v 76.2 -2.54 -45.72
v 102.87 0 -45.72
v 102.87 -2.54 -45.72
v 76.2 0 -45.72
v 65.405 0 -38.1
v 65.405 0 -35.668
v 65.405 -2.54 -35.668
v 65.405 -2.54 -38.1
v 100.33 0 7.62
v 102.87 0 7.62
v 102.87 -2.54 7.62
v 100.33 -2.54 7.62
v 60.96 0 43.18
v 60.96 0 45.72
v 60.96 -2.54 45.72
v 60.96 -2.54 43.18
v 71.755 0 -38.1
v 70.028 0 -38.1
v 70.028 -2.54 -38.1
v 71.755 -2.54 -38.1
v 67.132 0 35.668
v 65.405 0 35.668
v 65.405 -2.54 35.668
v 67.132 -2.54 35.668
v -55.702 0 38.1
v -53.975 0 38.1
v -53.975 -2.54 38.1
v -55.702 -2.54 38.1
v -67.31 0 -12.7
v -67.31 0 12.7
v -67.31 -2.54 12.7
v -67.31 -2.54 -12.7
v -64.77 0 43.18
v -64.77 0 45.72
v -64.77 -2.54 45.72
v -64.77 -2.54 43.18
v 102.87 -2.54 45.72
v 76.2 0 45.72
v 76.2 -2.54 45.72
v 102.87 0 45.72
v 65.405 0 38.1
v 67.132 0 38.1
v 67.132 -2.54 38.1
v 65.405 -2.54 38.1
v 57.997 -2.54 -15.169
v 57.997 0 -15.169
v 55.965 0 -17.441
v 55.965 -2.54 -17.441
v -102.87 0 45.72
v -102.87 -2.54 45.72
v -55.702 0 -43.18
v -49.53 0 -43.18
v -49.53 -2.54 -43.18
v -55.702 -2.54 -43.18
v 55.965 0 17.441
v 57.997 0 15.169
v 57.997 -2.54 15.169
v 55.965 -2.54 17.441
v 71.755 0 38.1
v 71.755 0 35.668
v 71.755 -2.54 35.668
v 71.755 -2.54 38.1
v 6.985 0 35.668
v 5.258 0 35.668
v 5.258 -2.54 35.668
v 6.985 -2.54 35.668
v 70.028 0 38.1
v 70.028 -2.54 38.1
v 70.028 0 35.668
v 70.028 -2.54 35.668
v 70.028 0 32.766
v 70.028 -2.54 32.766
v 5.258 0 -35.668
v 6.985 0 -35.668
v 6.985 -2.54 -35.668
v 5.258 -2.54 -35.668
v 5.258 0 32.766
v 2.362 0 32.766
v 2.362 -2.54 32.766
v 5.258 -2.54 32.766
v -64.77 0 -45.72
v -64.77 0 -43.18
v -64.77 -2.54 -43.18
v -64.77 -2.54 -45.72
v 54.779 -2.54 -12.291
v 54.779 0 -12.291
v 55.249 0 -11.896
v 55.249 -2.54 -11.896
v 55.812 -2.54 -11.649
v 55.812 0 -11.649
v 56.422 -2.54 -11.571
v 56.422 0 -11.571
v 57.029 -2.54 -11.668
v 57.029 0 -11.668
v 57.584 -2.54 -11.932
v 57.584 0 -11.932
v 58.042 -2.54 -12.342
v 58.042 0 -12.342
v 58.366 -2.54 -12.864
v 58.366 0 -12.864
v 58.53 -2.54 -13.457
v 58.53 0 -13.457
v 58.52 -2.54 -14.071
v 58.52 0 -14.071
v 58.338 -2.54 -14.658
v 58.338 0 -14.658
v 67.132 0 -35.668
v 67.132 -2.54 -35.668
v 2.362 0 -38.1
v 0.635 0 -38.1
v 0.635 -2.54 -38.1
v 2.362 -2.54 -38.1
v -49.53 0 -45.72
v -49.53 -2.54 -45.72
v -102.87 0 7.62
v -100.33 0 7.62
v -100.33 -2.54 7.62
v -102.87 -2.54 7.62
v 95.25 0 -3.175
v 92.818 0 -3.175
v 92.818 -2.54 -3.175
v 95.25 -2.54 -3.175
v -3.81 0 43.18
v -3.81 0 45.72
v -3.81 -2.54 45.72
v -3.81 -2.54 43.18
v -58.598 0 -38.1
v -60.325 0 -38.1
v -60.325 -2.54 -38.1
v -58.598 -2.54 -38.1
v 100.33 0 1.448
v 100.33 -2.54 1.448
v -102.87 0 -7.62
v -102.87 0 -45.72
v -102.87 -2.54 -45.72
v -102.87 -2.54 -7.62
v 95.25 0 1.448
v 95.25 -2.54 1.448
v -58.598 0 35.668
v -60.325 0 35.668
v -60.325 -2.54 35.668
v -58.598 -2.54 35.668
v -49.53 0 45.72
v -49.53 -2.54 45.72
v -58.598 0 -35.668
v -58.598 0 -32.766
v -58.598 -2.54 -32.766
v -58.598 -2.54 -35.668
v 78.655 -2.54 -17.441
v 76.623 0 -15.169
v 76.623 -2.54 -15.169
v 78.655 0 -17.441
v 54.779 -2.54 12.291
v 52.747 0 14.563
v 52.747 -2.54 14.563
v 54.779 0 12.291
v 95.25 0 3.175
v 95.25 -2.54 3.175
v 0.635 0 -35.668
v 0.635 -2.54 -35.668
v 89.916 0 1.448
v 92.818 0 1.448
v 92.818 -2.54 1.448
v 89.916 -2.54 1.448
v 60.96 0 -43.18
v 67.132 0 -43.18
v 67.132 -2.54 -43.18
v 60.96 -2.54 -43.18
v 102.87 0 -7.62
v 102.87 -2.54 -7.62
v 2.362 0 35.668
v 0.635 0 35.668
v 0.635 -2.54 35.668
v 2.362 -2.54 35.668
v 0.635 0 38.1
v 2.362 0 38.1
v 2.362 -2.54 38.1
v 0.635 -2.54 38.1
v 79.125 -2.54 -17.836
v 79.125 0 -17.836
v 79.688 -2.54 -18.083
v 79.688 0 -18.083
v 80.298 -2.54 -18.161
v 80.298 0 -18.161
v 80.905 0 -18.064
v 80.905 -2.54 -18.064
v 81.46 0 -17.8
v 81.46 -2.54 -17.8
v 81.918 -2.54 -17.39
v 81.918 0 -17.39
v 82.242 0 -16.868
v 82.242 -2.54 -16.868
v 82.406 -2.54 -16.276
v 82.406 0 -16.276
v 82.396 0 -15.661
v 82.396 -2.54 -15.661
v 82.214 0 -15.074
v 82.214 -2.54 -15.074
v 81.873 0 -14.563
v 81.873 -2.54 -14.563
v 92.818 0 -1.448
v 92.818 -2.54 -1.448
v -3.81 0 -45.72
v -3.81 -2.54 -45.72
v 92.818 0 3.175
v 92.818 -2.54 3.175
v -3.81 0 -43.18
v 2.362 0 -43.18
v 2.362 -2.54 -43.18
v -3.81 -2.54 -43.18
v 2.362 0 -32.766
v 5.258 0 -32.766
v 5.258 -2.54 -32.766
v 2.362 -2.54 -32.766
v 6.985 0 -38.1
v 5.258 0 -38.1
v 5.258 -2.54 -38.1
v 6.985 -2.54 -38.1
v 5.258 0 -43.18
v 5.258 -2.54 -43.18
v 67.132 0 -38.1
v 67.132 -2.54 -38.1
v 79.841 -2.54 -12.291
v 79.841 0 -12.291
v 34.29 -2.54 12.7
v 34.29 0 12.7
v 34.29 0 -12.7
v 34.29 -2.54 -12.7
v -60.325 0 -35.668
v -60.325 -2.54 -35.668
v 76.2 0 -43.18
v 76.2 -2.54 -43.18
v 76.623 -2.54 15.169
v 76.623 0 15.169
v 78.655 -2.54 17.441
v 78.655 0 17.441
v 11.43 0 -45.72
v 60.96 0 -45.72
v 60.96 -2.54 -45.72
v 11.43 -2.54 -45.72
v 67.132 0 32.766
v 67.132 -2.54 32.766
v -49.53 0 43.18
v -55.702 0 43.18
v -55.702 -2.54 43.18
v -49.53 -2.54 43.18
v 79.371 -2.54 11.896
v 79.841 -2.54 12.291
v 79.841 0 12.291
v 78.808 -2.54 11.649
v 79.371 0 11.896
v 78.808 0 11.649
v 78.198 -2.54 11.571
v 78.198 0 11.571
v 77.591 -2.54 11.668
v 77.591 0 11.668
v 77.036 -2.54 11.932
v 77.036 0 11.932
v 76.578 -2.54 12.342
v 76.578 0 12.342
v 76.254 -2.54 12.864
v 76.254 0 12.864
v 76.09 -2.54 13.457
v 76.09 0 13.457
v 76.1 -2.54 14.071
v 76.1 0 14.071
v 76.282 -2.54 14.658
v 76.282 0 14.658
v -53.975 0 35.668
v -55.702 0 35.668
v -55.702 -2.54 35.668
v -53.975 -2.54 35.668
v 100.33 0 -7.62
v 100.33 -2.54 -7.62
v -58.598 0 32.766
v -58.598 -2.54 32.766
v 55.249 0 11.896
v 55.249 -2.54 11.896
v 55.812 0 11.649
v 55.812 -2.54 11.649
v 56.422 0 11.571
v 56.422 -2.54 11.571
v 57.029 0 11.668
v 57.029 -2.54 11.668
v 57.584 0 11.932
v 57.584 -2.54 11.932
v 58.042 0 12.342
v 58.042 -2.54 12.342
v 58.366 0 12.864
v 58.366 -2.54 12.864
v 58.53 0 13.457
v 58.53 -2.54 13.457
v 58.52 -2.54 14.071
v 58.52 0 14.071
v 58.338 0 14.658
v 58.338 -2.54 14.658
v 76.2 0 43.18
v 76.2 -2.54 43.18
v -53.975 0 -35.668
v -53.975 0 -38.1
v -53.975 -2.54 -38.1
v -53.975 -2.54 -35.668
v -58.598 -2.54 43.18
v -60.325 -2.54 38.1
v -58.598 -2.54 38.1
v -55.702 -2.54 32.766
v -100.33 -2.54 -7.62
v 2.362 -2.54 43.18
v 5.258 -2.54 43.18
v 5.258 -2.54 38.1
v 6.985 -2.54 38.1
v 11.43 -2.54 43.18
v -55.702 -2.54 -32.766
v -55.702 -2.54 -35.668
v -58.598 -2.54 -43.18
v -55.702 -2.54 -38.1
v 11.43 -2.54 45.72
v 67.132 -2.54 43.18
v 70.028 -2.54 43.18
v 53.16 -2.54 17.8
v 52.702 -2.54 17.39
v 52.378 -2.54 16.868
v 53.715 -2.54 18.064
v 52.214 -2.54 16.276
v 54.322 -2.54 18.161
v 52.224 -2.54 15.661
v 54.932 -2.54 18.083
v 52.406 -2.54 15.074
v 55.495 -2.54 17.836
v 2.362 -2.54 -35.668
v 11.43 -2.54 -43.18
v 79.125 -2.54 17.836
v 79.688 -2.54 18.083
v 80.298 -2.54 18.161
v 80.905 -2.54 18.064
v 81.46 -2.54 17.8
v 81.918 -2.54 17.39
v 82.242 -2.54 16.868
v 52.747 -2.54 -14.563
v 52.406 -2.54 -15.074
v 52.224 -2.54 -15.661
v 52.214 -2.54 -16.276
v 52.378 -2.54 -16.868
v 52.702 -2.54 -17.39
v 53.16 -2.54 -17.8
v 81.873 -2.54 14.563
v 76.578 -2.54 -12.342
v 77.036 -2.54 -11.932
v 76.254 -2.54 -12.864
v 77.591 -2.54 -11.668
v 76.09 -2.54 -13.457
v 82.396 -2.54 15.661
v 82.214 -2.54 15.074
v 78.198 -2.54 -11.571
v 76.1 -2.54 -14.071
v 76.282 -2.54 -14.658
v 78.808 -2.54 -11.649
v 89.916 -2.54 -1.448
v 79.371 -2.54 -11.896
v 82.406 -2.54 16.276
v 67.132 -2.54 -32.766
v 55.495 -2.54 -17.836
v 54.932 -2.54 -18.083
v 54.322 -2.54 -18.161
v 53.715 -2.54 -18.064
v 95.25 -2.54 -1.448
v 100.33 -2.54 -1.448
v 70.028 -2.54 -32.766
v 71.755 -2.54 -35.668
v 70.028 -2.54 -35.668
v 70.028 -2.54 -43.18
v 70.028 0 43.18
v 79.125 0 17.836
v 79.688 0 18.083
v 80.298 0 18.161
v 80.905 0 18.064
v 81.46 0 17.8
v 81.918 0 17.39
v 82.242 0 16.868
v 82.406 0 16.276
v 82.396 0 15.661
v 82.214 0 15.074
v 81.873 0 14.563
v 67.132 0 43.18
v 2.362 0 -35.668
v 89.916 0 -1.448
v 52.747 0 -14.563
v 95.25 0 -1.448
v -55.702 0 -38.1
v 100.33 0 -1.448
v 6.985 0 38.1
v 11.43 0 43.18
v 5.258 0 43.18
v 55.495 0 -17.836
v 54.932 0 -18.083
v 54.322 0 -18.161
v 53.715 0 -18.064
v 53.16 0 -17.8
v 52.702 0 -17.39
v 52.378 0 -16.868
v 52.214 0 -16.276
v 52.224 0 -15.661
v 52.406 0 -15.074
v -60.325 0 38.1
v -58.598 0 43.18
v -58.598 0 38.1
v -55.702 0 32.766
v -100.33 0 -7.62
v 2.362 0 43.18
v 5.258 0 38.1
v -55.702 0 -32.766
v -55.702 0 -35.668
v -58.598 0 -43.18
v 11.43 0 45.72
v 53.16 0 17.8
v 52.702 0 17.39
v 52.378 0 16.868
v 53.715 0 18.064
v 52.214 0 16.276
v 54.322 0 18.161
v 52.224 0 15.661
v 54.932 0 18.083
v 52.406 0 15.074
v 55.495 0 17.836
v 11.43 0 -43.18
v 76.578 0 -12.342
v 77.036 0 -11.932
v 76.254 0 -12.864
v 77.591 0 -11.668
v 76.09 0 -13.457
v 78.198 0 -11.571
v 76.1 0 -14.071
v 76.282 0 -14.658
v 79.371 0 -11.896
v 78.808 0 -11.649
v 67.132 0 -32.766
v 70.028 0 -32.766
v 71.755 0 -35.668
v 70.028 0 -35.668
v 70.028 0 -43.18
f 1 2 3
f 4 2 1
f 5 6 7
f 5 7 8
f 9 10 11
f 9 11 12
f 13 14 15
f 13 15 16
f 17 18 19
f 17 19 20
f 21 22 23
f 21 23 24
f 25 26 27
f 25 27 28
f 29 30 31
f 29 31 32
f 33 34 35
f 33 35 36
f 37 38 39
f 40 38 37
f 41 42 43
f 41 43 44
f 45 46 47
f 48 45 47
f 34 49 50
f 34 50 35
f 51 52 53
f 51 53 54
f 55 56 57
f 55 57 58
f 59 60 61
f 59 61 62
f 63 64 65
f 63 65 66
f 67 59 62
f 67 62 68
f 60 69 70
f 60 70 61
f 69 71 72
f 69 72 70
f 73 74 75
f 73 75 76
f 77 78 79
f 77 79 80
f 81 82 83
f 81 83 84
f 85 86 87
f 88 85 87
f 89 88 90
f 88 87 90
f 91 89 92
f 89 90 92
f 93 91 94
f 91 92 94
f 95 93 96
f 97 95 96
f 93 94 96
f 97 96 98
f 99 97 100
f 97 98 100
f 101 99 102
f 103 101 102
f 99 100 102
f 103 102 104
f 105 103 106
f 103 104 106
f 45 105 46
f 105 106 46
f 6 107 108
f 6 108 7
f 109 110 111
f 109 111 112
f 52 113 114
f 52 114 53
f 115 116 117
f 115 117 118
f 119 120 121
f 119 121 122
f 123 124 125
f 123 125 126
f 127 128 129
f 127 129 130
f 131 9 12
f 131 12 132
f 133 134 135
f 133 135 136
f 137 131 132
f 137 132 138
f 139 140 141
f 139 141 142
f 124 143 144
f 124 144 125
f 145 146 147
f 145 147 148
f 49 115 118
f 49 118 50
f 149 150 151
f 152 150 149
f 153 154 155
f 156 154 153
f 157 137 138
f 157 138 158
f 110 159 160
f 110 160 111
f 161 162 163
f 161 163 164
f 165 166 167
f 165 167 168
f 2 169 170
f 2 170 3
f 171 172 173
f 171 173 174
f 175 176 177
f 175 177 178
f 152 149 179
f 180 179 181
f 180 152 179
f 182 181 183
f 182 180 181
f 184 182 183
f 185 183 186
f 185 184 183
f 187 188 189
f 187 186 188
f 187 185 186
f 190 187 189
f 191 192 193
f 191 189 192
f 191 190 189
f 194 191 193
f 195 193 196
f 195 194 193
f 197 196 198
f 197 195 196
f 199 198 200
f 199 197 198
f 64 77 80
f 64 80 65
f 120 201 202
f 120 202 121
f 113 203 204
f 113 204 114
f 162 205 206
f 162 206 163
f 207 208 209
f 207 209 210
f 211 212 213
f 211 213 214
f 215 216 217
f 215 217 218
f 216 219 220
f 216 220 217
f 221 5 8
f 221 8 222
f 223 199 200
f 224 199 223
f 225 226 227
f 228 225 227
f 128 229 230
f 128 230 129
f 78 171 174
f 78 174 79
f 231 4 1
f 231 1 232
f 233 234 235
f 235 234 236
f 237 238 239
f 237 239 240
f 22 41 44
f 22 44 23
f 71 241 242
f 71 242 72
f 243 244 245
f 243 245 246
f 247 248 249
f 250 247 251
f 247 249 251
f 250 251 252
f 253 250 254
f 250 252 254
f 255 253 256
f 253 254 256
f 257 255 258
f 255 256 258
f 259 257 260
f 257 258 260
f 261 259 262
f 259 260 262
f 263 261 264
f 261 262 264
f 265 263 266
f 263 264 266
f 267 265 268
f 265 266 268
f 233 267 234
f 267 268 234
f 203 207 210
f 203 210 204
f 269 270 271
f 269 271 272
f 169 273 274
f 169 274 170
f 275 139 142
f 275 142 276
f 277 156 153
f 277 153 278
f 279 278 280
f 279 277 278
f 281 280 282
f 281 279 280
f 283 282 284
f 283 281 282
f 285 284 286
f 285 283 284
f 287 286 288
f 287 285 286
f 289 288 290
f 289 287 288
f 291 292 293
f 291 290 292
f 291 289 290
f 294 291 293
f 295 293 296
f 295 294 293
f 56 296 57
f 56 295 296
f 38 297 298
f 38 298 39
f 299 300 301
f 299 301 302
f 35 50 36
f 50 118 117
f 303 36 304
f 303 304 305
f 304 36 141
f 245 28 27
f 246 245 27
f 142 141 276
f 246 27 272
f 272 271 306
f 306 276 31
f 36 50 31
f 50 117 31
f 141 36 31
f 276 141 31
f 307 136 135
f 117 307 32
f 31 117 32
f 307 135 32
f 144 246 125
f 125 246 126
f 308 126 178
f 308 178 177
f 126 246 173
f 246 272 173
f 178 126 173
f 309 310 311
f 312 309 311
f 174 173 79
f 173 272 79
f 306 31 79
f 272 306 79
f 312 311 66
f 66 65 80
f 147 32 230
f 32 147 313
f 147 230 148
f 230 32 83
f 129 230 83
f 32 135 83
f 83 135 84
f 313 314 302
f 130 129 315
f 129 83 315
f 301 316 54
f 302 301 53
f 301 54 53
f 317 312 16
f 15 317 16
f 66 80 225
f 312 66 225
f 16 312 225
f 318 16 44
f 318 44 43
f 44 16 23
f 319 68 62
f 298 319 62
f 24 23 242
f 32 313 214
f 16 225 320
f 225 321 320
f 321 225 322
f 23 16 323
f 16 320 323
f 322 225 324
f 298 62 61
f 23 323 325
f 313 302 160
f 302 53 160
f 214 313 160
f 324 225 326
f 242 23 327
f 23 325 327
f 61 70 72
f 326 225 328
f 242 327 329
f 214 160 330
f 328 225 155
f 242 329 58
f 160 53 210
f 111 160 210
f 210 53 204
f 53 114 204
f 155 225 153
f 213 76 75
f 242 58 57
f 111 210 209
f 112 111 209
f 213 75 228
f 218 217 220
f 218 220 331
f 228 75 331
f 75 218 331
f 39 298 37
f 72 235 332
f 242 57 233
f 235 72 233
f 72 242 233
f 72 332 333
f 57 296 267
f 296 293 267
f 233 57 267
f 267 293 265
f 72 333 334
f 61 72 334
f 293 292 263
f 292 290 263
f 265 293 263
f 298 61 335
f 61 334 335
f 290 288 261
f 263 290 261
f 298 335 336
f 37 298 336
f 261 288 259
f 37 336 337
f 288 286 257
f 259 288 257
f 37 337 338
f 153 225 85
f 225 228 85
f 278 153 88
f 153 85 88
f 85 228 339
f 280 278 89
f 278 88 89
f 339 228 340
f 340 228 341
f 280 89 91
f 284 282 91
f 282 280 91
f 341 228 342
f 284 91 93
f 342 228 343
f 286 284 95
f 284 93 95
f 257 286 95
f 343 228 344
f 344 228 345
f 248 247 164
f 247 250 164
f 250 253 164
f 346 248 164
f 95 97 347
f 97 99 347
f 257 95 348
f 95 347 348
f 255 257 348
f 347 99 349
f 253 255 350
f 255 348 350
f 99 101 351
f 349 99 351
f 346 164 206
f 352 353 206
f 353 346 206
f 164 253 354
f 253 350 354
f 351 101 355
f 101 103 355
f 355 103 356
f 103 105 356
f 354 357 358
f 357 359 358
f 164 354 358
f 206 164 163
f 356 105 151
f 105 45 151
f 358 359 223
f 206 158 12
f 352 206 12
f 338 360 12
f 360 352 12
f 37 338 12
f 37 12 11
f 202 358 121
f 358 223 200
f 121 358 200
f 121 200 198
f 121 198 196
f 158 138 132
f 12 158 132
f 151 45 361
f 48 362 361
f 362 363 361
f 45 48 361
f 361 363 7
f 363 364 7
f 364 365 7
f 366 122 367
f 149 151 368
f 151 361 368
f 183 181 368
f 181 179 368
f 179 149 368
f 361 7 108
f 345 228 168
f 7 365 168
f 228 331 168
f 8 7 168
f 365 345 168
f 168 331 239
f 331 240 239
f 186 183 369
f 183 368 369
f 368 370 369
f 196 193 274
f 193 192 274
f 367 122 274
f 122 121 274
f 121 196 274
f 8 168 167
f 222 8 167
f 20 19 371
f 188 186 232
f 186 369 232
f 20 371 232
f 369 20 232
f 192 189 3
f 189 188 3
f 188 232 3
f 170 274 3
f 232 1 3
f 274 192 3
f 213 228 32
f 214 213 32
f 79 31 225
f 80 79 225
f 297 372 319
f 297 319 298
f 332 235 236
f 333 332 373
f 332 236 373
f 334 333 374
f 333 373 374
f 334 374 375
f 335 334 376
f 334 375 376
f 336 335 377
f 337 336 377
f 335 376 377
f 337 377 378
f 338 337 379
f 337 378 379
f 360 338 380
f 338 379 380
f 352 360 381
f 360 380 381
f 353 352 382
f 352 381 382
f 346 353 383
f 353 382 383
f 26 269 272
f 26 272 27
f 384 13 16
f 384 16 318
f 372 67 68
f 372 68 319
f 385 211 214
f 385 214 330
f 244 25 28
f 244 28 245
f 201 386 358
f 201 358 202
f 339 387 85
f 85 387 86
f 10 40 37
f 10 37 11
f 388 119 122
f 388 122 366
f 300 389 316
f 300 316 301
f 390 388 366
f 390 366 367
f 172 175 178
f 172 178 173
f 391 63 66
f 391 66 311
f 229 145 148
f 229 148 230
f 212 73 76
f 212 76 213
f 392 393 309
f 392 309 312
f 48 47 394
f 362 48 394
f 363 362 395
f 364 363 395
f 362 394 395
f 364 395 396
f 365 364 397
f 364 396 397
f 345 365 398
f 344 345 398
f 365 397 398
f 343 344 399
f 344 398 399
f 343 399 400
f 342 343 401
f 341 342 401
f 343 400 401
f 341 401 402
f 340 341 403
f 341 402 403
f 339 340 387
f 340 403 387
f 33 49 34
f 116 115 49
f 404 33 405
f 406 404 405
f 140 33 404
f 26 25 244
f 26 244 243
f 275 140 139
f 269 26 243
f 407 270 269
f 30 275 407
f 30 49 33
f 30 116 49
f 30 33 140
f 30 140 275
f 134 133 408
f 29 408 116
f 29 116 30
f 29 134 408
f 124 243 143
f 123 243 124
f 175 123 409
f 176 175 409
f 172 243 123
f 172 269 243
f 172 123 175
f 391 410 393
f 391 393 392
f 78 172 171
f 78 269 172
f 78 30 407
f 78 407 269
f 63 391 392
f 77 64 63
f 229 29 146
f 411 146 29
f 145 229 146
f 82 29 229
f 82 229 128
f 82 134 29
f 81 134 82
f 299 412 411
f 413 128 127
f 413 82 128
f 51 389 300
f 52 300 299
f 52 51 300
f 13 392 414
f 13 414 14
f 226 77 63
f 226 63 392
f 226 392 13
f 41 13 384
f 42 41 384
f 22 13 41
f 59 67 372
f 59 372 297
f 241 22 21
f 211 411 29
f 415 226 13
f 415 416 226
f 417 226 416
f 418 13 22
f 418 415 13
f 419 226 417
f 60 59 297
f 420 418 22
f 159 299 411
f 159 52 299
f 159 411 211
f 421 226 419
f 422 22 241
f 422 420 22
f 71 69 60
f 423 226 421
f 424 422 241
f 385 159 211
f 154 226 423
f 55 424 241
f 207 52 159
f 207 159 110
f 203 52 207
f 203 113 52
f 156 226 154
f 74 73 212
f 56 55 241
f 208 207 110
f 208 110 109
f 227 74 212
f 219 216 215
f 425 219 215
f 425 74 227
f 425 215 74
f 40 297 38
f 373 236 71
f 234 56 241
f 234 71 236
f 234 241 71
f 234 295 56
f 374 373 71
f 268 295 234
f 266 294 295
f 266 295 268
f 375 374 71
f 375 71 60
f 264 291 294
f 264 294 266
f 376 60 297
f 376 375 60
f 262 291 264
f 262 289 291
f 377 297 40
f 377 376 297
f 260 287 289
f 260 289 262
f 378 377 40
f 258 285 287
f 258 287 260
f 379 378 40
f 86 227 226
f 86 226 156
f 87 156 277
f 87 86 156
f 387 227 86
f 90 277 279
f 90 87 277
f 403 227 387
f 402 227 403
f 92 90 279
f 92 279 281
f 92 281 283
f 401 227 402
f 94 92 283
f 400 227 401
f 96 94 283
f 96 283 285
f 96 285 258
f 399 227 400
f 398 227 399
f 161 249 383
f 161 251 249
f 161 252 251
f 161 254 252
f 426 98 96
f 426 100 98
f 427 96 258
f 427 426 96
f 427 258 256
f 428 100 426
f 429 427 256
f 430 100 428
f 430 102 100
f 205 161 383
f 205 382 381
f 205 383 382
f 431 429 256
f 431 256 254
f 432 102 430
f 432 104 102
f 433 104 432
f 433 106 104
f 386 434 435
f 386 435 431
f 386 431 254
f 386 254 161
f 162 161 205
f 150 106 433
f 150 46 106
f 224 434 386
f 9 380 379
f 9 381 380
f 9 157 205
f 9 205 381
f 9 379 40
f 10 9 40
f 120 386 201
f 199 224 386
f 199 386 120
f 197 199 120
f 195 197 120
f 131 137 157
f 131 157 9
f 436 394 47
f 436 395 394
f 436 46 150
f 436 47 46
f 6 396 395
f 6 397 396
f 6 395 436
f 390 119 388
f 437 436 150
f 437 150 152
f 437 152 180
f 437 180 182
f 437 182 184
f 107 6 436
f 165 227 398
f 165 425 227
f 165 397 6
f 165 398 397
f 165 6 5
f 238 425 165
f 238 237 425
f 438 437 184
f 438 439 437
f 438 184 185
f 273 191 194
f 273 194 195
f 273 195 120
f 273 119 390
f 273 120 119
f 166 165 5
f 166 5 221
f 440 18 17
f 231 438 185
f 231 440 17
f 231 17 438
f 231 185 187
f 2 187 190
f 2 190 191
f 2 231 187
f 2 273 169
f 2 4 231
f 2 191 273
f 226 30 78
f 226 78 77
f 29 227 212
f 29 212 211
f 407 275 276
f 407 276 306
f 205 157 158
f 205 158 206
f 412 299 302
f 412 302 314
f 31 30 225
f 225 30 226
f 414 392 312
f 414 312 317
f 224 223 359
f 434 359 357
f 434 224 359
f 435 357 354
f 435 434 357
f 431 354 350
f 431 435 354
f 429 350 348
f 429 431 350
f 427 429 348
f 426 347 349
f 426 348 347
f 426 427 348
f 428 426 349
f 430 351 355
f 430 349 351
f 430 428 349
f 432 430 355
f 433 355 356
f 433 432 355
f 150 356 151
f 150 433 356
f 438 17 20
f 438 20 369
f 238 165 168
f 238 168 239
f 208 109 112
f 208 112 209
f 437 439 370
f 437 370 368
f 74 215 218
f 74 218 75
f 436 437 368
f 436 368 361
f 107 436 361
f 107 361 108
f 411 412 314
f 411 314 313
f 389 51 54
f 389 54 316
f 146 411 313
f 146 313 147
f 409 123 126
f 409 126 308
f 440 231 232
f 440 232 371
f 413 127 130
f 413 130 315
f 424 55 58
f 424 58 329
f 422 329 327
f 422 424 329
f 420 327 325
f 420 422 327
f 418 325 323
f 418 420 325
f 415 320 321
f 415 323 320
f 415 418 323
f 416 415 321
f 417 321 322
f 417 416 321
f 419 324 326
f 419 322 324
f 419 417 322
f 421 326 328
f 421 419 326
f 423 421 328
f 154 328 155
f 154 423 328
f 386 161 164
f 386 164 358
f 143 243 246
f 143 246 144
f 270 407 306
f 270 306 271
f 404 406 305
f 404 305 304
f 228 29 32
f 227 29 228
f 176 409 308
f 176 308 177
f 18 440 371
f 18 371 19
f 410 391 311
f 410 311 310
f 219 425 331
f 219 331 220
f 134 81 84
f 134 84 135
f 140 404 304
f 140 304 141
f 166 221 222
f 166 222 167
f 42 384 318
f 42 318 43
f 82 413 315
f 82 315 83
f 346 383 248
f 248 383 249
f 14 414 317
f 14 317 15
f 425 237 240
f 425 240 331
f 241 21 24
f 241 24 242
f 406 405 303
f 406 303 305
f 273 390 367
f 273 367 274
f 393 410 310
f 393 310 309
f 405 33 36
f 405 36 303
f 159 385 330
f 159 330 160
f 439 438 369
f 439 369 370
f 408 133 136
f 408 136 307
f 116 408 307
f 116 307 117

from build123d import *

# Parameters (mm, degrees)
BOSS_EXTRUDE1_DEPTH = 2.54
CUT_EXTRUDE1_REACH  = 4.54
CUT_EXTRUDE2_REACH  = 4.54
SKETCH4_W           = 101.6
SKETCH4_H           = 25.4


with BuildPart() as part:
    # Sketch2 → Boss-Extrude1 (new body)
    with BuildSketch(Plane(origin=(0, 0, 0), x_dir=(1, 0, 0), z_dir=(0, 1, 0))):
        Polygon((-102.87, -45.72), (-64.77, -45.72), (-64.77, -43.18), (-58.5978, -43.18), (-58.5978, -38.1), (-60.325, -38.1), (-60.325, -35.66795), (-58.5978, -35.66795), (-58.5978, -32.766), (-55.7022, -32.766), (-55.7022, -35.66795), (-53.975, -35.66795), (-53.975, -38.1), (-55.7022, -38.1), (-55.7022, -43.18), (-49.53, -43.18), (-49.53, -45.72), (-3.81, -45.72), (-3.81, -43.18), (2.3622, -43.18), (2.3622, -38.1), (0.635, -38.1), (0.635, -35.66795), (2.3622, -35.66795), (2.3622, -32.766), (5.2578, -32.766), (5.2578, -35.66795), (6.985, -35.66795), (6.985, -38.1), (5.2578, -38.1), (5.2578, -43.18), (11.43, -43.18), (11.43, -45.72), (60.96, -45.72), (60.96, -43.18), (67.1322, -43.18), (67.1322, -38.1), (65.405, -38.1), (65.405, -35.66795), (67.1322, -35.66795), (67.1322, -32.766), (70.0278, -32.766), (70.0278, -35.66795), (71.755, -35.66795), (71.755, -38.1), (70.0278, -38.1), (70.0278, -43.18), (76.2, -43.18), (76.2, -45.72), (102.87, -45.72), (102.87, -7.62), (100.33, -7.62), (100.33, -1.4478), (95.25, -1.4478), (95.25, -3.175), (92.81795, -3.175), (92.81795, -1.4478), (89.916, -1.4478), (89.916, 1.4478), (92.81795, 1.4478), (92.81795, 3.175), (95.25, 3.175), (95.25, 1.4478), (100.33, 1.4478), (100.33, 7.62), (102.87, 7.62), (102.87, 45.72), (76.2, 45.72), (76.2, 43.18), (70.0278, 43.18), (70.0278, 38.1), (71.755, 38.1), (71.755, 35.66795), (70.0278, 35.66795), (70.0278, 32.766), (67.1322, 32.766), (67.1322, 35.66795), (65.405, 35.66795), (65.405, 38.1), (67.1322, 38.1), (67.1322, 43.18), (60.96, 43.18), (60.96, 45.72), (11.43, 45.72), (11.43, 43.18), (5.2578, 43.18), (5.2578, 38.1), (6.985, 38.1), (6.985, 35.66795), (5.2578, 35.66795), (5.2578, 32.766), (2.3622, 32.766), (2.3622, 35.66795), (0.635, 35.66795), (0.635, 38.1), (2.3622, 38.1), (2.3622, 43.18), (-3.81, 43.18), (-3.81, 45.72), (-49.53, 45.72), (-49.53, 43.18), (-55.7022, 43.18), (-55.7022, 38.1), (-53.975, 38.1), (-53.975, 35.66795), (-55.7022, 35.66795), (-55.7022, 32.766), (-58.5978, 32.766), (-58.5978, 35.66795), (-60.325, 35.66795), (-60.325, 38.1), (-58.5978, 38.1), (-58.5978, 43.18), (-64.77, 43.18), (-64.77, 45.72), (-102.87, 45.72), (-102.87, 7.62), (-100.33, 7.62), (-100.33, -7.62), (-102.87, -7.62), align=None)
    extrude(amount=-BOSS_EXTRUDE1_DEPTH)

    # Sketch3 → Cut-Extrude1 (cut, up to next)
    with BuildSketch(Plane(origin=(0, 0, 0), x_dir=(1, 0, 0), z_dir=(0, 1, 0)), mode=Mode.PRIVATE) as cut_extrude1_sk1:
        with BuildLine():
            Line((81.873223588, 14.562666667), (79.841223588, 12.290821602))
            ThreePointArc((79.841223588, 12.290821602), (76.792666667, 12.120931347), (76.622776412, 15.169488268))
            Line((76.622776412, 15.169488268), (78.654776412, 17.441333333))
            ThreePointArc((78.654776412, 17.441333333), (81.703333333, 17.611223588), (81.873223588, 14.562666667))
        make_face()
    cut_extrude1_tool1 = extrude(cut_extrude1_sk1.sketch, amount=-CUT_EXTRUDE1_REACH, mode=Mode.PRIVATE) & part.part
    add(cut_extrude1_tool1.solids().sort_by_distance((79.248, 0, -14.866077))[0], mode=Mode.SUBTRACT)
    # Sketch3 → Cut-Extrude1 (cut, up to next)
    with BuildSketch(Plane(origin=(0, 0, 0), x_dir=(1, 0, 0), z_dir=(0, 1, 0)), mode=Mode.PRIVATE) as cut_extrude1_sk2:
        with BuildLine():
            Line((52.746776412, 14.562666667), (54.778776412, 12.290821602))
            ThreePointArc((54.778776412, 12.290821602), (57.827333333, 12.120931347), (57.997223588, 15.169488268))
            Line((57.997223588, 15.169488268), (55.965223588, 17.441333333))
            ThreePointArc((55.965223588, 17.441333333), (52.916666667, 17.611223588), (52.746776412, 14.562666667))
        make_face()
    cut_extrude1_tool2 = extrude(cut_extrude1_sk2.sketch, amount=-CUT_EXTRUDE1_REACH, mode=Mode.PRIVATE) & part.part
    add(cut_extrude1_tool2.solids().sort_by_distance((55.372, 0, -14.866077))[0], mode=Mode.SUBTRACT)
    # Sketch3 → Cut-Extrude1 (cut, up to next)
    with BuildSketch(Plane(origin=(0, 0, 0), x_dir=(1, 0, 0), z_dir=(0, 1, 0)), mode=Mode.PRIVATE) as cut_extrude1_sk3:
        with BuildLine():
            Line((81.873223588, -14.562666667), (79.841223588, -12.290821602))
            ThreePointArc((79.841223588, -12.290821602), (76.792666667, -12.120931347), (76.622776412, -15.169488268))
            Line((76.622776412, -15.169488268), (78.654776412, -17.441333333))
            ThreePointArc((78.654776412, -17.441333333), (81.703333333, -17.611223588), (81.873223588, -14.562666667))
        make_face()
    cut_extrude1_tool3 = extrude(cut_extrude1_sk3.sketch, amount=-CUT_EXTRUDE1_REACH, mode=Mode.PRIVATE) & part.part
    add(cut_extrude1_tool3.solids().sort_by_distance((79.248, 0, 14.866077))[0], mode=Mode.SUBTRACT)
    # Sketch3 → Cut-Extrude1 (cut, up to next)
    with BuildSketch(Plane(origin=(0, 0, 0), x_dir=(1, 0, 0), z_dir=(0, 1, 0)), mode=Mode.PRIVATE) as cut_extrude1_sk4:
        with BuildLine():
            Line((52.746776412, -14.562666667), (54.778776412, -12.290821602))
            ThreePointArc((54.778776412, -12.290821602), (57.827333333, -12.120931347), (57.997223588, -15.169488268))
            Line((57.997223588, -15.169488268), (55.965223588, -17.441333333))
            ThreePointArc((55.965223588, -17.441333333), (52.916666667, -17.611223588), (52.746776412, -14.562666667))
        make_face()
    cut_extrude1_tool4 = extrude(cut_extrude1_sk4.sketch, amount=-CUT_EXTRUDE1_REACH, mode=Mode.PRIVATE) & part.part
    add(cut_extrude1_tool4.solids().sort_by_distance((55.372, 0, 14.866077))[0], mode=Mode.SUBTRACT)

    # Sketch4 → Cut-Extrude2 (cut, up to next)
    with BuildSketch(Plane(origin=(0, 0, 0), x_dir=(1, 0, 0), z_dir=(0, 1, 0)), mode=Mode.PRIVATE) as cut_extrude2_sk1:
        with Locations((-16.51, 0)):
            Rectangle(SKETCH4_W, SKETCH4_H)
    cut_extrude2_tool1 = extrude(cut_extrude2_sk1.sketch, amount=-CUT_EXTRUDE2_REACH, mode=Mode.PRIVATE) & part.part
    add(cut_extrude2_tool1.solids().sort_by_distance((-16.51, 0, 0))[0], mode=Mode.SUBTRACT)


solid = part.part
